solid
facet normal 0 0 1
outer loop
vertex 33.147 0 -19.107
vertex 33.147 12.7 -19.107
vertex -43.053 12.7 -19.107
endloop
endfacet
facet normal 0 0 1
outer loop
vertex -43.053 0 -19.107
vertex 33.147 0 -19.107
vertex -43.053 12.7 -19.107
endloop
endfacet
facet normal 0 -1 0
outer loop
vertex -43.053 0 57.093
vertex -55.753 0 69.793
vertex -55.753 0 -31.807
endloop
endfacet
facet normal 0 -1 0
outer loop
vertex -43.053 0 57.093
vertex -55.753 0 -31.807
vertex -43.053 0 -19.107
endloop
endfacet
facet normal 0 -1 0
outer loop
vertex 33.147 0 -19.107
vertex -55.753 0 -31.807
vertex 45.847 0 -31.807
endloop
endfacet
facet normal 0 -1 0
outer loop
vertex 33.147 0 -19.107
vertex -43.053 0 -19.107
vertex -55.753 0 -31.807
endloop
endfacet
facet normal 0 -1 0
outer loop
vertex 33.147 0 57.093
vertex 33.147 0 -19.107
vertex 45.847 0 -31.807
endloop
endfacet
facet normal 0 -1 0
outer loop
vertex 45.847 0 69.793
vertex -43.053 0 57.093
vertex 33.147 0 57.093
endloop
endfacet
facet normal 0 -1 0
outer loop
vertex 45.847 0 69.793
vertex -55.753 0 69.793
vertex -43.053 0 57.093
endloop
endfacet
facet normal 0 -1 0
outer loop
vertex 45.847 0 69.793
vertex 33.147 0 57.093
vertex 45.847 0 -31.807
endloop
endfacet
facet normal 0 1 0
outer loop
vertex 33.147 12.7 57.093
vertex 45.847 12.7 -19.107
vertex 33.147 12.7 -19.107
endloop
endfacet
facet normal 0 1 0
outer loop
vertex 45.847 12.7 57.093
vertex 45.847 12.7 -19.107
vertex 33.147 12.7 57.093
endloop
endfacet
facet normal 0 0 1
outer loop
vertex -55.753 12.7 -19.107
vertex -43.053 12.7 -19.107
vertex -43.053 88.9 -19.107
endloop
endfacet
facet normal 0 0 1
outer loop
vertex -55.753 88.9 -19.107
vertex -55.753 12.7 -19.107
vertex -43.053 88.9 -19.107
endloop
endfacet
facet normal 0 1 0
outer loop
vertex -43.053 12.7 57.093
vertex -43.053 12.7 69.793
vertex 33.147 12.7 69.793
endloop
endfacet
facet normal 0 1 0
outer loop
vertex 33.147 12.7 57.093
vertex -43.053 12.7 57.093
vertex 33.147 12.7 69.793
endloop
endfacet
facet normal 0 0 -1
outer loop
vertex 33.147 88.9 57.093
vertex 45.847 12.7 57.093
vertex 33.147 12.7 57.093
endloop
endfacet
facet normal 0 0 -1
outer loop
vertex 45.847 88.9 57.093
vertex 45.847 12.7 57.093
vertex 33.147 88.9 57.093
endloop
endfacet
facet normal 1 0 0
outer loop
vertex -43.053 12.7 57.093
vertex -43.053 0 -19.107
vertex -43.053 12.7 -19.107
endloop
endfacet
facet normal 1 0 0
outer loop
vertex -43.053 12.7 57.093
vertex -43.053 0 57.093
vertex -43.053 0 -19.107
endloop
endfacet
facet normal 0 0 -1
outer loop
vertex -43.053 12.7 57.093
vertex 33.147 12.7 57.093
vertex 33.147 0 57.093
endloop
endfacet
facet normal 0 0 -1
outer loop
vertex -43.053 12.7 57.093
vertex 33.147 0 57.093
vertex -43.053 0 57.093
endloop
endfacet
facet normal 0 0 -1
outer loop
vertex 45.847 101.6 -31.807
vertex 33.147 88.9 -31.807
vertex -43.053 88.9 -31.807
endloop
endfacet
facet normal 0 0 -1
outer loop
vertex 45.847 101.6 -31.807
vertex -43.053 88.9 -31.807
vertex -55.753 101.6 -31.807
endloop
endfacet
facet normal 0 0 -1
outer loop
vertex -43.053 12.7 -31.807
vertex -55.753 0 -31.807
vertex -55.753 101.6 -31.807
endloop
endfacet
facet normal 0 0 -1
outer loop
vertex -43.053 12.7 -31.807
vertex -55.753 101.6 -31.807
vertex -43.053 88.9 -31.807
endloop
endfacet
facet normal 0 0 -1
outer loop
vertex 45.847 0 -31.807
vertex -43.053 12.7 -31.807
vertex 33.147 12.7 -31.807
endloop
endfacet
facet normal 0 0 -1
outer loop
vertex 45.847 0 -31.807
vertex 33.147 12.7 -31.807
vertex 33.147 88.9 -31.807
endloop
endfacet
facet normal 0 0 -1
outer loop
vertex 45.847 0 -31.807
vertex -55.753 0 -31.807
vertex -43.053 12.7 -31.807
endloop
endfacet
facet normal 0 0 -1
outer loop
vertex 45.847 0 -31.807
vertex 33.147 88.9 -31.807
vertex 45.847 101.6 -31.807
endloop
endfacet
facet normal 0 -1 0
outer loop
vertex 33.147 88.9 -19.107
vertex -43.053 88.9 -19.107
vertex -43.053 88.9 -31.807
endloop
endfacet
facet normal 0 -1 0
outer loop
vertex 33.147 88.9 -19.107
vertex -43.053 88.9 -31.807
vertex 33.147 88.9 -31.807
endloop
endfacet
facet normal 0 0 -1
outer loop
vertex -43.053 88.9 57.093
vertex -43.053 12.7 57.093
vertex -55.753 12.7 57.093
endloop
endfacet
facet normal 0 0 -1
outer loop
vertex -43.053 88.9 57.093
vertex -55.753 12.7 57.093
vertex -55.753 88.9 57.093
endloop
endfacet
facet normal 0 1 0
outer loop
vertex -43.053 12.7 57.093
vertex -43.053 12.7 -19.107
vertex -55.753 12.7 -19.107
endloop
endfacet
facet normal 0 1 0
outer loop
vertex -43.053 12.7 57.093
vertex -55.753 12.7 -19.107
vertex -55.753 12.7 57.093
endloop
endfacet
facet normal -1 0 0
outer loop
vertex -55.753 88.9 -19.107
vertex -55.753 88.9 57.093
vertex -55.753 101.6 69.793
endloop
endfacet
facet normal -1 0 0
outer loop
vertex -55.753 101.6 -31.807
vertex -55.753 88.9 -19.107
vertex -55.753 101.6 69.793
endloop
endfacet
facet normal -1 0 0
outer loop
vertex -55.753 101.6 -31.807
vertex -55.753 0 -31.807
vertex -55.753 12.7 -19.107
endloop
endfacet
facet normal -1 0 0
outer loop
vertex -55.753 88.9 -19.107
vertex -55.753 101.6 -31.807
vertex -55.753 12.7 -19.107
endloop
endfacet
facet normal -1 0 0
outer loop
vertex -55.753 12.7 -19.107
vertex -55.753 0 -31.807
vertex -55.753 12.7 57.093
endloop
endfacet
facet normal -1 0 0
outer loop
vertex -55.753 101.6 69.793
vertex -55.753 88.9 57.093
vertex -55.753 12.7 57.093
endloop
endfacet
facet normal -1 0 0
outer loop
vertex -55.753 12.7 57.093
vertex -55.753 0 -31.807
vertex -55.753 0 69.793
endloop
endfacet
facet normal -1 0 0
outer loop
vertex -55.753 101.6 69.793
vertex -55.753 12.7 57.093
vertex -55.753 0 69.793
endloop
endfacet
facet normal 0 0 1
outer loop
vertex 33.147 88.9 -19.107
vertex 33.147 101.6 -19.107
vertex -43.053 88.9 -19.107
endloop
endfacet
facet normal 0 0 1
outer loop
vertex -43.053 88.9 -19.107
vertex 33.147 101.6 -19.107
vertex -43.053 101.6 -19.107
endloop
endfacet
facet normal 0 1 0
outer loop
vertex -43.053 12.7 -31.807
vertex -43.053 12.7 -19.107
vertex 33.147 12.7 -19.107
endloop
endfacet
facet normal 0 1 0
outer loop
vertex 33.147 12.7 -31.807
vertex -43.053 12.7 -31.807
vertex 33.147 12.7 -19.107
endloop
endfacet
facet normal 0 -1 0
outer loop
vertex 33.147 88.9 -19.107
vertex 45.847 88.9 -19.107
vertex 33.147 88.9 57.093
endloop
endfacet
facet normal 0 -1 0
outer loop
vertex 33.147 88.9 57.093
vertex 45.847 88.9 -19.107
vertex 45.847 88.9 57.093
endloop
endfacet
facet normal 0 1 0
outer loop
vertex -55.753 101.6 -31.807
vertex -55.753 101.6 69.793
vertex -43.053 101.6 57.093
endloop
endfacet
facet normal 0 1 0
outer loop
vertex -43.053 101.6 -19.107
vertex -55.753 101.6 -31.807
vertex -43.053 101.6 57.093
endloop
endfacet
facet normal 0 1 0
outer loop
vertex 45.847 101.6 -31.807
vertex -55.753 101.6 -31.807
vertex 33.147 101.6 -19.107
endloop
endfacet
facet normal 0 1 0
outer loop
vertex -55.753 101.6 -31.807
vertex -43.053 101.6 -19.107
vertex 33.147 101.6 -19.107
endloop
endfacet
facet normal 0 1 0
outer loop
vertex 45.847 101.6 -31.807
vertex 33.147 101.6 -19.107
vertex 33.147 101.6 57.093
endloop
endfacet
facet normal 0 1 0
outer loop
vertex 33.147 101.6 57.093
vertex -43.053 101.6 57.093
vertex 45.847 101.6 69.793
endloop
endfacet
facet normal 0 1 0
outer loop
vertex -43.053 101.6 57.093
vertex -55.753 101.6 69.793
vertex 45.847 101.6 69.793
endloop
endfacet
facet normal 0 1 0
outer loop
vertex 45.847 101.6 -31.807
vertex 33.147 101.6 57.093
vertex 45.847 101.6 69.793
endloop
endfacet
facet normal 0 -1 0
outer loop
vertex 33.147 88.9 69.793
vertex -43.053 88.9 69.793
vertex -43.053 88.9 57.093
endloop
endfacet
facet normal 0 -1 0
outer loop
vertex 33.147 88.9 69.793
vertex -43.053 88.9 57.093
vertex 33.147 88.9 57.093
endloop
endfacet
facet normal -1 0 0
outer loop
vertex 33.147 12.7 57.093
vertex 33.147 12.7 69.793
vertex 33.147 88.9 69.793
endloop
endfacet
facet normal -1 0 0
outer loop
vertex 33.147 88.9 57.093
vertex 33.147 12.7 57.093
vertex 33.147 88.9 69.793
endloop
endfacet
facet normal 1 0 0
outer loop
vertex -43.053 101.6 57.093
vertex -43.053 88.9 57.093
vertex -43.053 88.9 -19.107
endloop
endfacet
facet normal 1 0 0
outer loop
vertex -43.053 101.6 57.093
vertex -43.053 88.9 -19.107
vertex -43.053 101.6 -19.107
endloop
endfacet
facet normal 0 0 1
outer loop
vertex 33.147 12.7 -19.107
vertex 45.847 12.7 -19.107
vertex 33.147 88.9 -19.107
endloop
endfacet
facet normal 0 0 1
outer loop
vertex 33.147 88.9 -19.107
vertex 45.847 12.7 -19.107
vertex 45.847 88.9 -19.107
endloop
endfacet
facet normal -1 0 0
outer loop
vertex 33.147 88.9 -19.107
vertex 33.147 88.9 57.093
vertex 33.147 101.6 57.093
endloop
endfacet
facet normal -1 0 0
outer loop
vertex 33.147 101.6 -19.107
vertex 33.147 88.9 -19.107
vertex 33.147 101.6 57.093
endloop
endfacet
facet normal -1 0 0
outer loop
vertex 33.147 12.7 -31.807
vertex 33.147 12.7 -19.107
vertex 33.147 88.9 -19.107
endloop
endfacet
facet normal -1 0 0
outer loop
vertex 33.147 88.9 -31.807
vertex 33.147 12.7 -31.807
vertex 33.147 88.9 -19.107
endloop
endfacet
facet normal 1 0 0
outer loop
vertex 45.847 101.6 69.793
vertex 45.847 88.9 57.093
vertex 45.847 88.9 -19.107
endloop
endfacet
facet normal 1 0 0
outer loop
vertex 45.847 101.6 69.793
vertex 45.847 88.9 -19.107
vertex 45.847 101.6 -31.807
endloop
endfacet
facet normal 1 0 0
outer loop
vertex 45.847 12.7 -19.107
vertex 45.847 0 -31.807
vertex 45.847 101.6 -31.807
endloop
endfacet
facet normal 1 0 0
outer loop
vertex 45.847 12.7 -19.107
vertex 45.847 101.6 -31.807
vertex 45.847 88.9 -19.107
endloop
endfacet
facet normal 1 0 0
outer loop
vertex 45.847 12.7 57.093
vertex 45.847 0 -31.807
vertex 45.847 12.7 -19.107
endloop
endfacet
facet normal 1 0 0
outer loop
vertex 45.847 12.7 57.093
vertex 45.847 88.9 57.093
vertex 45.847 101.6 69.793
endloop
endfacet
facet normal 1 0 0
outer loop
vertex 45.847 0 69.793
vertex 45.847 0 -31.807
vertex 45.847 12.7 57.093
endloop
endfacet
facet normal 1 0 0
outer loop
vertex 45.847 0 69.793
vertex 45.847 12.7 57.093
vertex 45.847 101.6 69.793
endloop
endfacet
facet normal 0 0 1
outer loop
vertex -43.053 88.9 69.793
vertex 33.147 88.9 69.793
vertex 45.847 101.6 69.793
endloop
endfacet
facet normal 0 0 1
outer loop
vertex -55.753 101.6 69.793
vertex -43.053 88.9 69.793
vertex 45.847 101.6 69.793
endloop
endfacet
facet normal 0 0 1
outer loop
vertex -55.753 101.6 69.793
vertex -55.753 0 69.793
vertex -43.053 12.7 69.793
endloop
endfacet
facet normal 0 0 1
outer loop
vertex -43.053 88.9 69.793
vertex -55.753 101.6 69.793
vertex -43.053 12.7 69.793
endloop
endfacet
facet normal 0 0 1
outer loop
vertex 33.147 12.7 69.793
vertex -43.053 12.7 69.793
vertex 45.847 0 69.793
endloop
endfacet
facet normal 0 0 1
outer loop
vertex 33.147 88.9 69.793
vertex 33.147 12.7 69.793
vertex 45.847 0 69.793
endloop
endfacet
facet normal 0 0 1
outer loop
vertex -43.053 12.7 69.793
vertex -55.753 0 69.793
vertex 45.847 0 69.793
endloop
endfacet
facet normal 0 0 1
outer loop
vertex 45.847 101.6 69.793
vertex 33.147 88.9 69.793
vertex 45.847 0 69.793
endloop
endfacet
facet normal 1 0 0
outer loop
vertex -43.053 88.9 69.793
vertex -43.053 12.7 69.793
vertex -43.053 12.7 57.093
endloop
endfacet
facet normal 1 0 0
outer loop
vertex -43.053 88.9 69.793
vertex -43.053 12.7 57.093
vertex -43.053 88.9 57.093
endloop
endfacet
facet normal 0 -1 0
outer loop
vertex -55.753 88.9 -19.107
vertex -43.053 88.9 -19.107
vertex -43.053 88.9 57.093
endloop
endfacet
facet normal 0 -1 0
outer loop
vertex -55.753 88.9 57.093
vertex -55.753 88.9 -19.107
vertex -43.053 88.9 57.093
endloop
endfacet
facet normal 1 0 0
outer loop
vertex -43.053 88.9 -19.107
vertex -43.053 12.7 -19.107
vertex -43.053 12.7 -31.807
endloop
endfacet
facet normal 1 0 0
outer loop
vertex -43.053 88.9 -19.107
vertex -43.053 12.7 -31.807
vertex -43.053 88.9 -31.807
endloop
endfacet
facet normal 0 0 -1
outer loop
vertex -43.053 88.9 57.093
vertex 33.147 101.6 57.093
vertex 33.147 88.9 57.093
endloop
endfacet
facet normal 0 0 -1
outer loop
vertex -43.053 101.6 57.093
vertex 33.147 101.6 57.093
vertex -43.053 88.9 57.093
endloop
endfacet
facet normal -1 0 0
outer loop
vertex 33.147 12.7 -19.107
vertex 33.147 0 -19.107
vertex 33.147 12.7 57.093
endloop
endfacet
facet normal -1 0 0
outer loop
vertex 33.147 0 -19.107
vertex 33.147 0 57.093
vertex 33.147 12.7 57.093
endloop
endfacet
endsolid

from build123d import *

# Parameters (mm, degrees)
F0_W      = 101.6
F0_H      = 101.6
F1_DEPTH  = 101.6
F2_W      = 76.2
F2_H      = 76.2
F3_DEPTH  = 76.2
F3_FACE_W = 76.2
F3_FACE_H = 76.2
F4_DEPTH  = 25.4
F5_W      = 76.2
F5_H      = 76.2
F6_DEPTH  = 101.6
F7_W      = 76.2
F7_H      = 76.2
F8_DEPTH  = 101.6


with BuildPart() as f1:
    # F0 (on Front) → F1 (new body)
    with BuildSketch(Plane.XZ):
        with Locations((-4.952999, 18.993384)):
            Rectangle(F0_W, F0_H)
    extrude(amount=-F1_DEPTH)

    # F2 (on face) → F3 (cut)
    with BuildSketch(Plane.XY.offset(69.793384)):
        with Locations((-4.952999, 50.8)):
            Rectangle(F2_W, F2_H)
    extrude(amount=-F3_DEPTH, mode=Mode.SUBTRACT)

    # F3_face (on face) → F4 (cut)
    with BuildSketch(Plane(origin=(-4.952999, 50.8, -6.406616), x_dir=(1, 0, 0), z_dir=(0, 0, 1))):
        Rectangle(F3_FACE_W, F3_FACE_H)
    extrude(amount=-F4_DEPTH, mode=Mode.SUBTRACT)

    # F5 (on face) → F6 (cut)
    with BuildSketch(Plane(origin=(0, 101.6, 0), x_dir=(-1, 0, 0), z_dir=(0, 1, 0))):
        with Locations((4.952999, 18.993384)):
            Rectangle(F5_W, F5_H)
    extrude(amount=-F6_DEPTH, mode=Mode.SUBTRACT)

    # F7 (on face) → F8 (cut)
    with BuildSketch(Plane.YZ.offset(45.847001)):
        with Locations((50.8, 18.993384)):
            Rectangle(F7_W, F7_H)
    extrude(amount=-F8_DEPTH, mode=Mode.SUBTRACT)


solid = f1.part
